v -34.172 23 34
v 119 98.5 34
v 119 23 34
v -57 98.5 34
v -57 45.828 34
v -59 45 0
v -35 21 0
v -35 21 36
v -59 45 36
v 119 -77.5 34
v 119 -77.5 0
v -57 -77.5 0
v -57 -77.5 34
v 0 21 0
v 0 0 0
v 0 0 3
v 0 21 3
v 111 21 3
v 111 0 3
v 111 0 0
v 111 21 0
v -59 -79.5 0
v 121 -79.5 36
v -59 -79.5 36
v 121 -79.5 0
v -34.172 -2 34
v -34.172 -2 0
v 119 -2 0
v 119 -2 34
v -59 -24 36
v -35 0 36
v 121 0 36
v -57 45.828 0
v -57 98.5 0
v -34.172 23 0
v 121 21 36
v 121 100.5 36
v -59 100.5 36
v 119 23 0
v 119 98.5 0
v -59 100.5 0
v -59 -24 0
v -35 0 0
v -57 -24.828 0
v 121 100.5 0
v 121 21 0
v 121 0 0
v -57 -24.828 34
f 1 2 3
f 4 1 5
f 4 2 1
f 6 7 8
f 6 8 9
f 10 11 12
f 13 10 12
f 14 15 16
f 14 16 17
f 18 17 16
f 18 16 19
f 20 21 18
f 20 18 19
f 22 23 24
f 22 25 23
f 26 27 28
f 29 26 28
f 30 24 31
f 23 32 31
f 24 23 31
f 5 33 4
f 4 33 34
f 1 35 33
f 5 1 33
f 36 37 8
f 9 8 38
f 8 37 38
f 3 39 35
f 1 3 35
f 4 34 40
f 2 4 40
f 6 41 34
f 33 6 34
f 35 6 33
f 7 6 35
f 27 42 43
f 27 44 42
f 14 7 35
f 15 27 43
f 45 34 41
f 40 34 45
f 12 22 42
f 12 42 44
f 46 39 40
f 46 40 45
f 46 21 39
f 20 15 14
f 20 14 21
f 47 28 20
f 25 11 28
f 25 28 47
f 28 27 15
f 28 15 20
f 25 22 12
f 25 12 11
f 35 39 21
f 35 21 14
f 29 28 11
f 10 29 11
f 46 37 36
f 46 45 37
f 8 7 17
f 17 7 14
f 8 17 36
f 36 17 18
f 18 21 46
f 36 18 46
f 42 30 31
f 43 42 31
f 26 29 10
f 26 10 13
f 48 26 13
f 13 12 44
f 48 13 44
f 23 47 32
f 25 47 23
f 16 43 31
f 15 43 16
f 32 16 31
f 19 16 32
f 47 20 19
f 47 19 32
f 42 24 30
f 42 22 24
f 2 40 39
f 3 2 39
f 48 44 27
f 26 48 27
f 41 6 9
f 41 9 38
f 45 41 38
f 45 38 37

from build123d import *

# Parameters (mm, degrees)
SKETCH_W     = 121
SKETCH_H     = 21
PAD_DEPTH    = 3
PAD001_DEPTH = 34
PAD002_DEPTH = 2
SKETCH003_W  = 10
SKETCH003_H  = 21
POCKET_DEPTH = 36.001


with BuildPart() as part:
    # Sketch → Pad (new body)
    with BuildSketch(Plane.XY):
        with Locations((60.5, 10.5)):
            Rectangle(SKETCH_W, SKETCH_H)
    extrude(amount=PAD_DEPTH)

    # Sketch001 (on Face5 of Pad) → Pad001 (join)
    with BuildSketch(Plane(origin=(0, 0, 0), x_dir=(1, 0, 0), z_dir=(0, 0, -1))):
        Polygon((121, -100.5), (121, -21), (-35, -21), (-59, -45), (-59, -100.5), align=None)
        Polygon((119, -98.5), (119, -23), (-34.171573, -23), (-57, -45.828427), (-57, -98.5), align=None, mode=Mode.SUBTRACT)
        Polygon((121, 0), (-35, 0), (-59, 24), (-59, 79.5), (121, 79.5), align=None)
        Polygon((-57, 77.5), (-57, 24.828427), (-34.171573, 2), (119, 2), (119, 77.5), align=None, mode=Mode.SUBTRACT)
    extrude(amount=-PAD001_DEPTH)

    # Sketch002 (on Face3 of Pad001) → Pad002 (join)
    with BuildSketch(Plane.XY.offset(34)):
        Polygon((-59, -79.5), (-59, -24), (-35, 0), (121, 0), (121, -79.5), align=None)
        Polygon((-35, 21), (-59, 45), (-59, 100.5), (121, 100.5), (121, 21), align=None)
    extrude(amount=PAD002_DEPTH)

    # Sketch003 (on Face5 of Pad002) → Pocket (cut, through all)
    with BuildSketch(Plane(origin=(0, 0, 0), x_dir=(1, 0, 0), z_dir=(0, 0, -1))):
        with Locations((116, -10.5)):
            Rectangle(SKETCH003_W, SKETCH003_H)
    extrude(amount=-POCKET_DEPTH, mode=Mode.SUBTRACT)


solid = part.part
